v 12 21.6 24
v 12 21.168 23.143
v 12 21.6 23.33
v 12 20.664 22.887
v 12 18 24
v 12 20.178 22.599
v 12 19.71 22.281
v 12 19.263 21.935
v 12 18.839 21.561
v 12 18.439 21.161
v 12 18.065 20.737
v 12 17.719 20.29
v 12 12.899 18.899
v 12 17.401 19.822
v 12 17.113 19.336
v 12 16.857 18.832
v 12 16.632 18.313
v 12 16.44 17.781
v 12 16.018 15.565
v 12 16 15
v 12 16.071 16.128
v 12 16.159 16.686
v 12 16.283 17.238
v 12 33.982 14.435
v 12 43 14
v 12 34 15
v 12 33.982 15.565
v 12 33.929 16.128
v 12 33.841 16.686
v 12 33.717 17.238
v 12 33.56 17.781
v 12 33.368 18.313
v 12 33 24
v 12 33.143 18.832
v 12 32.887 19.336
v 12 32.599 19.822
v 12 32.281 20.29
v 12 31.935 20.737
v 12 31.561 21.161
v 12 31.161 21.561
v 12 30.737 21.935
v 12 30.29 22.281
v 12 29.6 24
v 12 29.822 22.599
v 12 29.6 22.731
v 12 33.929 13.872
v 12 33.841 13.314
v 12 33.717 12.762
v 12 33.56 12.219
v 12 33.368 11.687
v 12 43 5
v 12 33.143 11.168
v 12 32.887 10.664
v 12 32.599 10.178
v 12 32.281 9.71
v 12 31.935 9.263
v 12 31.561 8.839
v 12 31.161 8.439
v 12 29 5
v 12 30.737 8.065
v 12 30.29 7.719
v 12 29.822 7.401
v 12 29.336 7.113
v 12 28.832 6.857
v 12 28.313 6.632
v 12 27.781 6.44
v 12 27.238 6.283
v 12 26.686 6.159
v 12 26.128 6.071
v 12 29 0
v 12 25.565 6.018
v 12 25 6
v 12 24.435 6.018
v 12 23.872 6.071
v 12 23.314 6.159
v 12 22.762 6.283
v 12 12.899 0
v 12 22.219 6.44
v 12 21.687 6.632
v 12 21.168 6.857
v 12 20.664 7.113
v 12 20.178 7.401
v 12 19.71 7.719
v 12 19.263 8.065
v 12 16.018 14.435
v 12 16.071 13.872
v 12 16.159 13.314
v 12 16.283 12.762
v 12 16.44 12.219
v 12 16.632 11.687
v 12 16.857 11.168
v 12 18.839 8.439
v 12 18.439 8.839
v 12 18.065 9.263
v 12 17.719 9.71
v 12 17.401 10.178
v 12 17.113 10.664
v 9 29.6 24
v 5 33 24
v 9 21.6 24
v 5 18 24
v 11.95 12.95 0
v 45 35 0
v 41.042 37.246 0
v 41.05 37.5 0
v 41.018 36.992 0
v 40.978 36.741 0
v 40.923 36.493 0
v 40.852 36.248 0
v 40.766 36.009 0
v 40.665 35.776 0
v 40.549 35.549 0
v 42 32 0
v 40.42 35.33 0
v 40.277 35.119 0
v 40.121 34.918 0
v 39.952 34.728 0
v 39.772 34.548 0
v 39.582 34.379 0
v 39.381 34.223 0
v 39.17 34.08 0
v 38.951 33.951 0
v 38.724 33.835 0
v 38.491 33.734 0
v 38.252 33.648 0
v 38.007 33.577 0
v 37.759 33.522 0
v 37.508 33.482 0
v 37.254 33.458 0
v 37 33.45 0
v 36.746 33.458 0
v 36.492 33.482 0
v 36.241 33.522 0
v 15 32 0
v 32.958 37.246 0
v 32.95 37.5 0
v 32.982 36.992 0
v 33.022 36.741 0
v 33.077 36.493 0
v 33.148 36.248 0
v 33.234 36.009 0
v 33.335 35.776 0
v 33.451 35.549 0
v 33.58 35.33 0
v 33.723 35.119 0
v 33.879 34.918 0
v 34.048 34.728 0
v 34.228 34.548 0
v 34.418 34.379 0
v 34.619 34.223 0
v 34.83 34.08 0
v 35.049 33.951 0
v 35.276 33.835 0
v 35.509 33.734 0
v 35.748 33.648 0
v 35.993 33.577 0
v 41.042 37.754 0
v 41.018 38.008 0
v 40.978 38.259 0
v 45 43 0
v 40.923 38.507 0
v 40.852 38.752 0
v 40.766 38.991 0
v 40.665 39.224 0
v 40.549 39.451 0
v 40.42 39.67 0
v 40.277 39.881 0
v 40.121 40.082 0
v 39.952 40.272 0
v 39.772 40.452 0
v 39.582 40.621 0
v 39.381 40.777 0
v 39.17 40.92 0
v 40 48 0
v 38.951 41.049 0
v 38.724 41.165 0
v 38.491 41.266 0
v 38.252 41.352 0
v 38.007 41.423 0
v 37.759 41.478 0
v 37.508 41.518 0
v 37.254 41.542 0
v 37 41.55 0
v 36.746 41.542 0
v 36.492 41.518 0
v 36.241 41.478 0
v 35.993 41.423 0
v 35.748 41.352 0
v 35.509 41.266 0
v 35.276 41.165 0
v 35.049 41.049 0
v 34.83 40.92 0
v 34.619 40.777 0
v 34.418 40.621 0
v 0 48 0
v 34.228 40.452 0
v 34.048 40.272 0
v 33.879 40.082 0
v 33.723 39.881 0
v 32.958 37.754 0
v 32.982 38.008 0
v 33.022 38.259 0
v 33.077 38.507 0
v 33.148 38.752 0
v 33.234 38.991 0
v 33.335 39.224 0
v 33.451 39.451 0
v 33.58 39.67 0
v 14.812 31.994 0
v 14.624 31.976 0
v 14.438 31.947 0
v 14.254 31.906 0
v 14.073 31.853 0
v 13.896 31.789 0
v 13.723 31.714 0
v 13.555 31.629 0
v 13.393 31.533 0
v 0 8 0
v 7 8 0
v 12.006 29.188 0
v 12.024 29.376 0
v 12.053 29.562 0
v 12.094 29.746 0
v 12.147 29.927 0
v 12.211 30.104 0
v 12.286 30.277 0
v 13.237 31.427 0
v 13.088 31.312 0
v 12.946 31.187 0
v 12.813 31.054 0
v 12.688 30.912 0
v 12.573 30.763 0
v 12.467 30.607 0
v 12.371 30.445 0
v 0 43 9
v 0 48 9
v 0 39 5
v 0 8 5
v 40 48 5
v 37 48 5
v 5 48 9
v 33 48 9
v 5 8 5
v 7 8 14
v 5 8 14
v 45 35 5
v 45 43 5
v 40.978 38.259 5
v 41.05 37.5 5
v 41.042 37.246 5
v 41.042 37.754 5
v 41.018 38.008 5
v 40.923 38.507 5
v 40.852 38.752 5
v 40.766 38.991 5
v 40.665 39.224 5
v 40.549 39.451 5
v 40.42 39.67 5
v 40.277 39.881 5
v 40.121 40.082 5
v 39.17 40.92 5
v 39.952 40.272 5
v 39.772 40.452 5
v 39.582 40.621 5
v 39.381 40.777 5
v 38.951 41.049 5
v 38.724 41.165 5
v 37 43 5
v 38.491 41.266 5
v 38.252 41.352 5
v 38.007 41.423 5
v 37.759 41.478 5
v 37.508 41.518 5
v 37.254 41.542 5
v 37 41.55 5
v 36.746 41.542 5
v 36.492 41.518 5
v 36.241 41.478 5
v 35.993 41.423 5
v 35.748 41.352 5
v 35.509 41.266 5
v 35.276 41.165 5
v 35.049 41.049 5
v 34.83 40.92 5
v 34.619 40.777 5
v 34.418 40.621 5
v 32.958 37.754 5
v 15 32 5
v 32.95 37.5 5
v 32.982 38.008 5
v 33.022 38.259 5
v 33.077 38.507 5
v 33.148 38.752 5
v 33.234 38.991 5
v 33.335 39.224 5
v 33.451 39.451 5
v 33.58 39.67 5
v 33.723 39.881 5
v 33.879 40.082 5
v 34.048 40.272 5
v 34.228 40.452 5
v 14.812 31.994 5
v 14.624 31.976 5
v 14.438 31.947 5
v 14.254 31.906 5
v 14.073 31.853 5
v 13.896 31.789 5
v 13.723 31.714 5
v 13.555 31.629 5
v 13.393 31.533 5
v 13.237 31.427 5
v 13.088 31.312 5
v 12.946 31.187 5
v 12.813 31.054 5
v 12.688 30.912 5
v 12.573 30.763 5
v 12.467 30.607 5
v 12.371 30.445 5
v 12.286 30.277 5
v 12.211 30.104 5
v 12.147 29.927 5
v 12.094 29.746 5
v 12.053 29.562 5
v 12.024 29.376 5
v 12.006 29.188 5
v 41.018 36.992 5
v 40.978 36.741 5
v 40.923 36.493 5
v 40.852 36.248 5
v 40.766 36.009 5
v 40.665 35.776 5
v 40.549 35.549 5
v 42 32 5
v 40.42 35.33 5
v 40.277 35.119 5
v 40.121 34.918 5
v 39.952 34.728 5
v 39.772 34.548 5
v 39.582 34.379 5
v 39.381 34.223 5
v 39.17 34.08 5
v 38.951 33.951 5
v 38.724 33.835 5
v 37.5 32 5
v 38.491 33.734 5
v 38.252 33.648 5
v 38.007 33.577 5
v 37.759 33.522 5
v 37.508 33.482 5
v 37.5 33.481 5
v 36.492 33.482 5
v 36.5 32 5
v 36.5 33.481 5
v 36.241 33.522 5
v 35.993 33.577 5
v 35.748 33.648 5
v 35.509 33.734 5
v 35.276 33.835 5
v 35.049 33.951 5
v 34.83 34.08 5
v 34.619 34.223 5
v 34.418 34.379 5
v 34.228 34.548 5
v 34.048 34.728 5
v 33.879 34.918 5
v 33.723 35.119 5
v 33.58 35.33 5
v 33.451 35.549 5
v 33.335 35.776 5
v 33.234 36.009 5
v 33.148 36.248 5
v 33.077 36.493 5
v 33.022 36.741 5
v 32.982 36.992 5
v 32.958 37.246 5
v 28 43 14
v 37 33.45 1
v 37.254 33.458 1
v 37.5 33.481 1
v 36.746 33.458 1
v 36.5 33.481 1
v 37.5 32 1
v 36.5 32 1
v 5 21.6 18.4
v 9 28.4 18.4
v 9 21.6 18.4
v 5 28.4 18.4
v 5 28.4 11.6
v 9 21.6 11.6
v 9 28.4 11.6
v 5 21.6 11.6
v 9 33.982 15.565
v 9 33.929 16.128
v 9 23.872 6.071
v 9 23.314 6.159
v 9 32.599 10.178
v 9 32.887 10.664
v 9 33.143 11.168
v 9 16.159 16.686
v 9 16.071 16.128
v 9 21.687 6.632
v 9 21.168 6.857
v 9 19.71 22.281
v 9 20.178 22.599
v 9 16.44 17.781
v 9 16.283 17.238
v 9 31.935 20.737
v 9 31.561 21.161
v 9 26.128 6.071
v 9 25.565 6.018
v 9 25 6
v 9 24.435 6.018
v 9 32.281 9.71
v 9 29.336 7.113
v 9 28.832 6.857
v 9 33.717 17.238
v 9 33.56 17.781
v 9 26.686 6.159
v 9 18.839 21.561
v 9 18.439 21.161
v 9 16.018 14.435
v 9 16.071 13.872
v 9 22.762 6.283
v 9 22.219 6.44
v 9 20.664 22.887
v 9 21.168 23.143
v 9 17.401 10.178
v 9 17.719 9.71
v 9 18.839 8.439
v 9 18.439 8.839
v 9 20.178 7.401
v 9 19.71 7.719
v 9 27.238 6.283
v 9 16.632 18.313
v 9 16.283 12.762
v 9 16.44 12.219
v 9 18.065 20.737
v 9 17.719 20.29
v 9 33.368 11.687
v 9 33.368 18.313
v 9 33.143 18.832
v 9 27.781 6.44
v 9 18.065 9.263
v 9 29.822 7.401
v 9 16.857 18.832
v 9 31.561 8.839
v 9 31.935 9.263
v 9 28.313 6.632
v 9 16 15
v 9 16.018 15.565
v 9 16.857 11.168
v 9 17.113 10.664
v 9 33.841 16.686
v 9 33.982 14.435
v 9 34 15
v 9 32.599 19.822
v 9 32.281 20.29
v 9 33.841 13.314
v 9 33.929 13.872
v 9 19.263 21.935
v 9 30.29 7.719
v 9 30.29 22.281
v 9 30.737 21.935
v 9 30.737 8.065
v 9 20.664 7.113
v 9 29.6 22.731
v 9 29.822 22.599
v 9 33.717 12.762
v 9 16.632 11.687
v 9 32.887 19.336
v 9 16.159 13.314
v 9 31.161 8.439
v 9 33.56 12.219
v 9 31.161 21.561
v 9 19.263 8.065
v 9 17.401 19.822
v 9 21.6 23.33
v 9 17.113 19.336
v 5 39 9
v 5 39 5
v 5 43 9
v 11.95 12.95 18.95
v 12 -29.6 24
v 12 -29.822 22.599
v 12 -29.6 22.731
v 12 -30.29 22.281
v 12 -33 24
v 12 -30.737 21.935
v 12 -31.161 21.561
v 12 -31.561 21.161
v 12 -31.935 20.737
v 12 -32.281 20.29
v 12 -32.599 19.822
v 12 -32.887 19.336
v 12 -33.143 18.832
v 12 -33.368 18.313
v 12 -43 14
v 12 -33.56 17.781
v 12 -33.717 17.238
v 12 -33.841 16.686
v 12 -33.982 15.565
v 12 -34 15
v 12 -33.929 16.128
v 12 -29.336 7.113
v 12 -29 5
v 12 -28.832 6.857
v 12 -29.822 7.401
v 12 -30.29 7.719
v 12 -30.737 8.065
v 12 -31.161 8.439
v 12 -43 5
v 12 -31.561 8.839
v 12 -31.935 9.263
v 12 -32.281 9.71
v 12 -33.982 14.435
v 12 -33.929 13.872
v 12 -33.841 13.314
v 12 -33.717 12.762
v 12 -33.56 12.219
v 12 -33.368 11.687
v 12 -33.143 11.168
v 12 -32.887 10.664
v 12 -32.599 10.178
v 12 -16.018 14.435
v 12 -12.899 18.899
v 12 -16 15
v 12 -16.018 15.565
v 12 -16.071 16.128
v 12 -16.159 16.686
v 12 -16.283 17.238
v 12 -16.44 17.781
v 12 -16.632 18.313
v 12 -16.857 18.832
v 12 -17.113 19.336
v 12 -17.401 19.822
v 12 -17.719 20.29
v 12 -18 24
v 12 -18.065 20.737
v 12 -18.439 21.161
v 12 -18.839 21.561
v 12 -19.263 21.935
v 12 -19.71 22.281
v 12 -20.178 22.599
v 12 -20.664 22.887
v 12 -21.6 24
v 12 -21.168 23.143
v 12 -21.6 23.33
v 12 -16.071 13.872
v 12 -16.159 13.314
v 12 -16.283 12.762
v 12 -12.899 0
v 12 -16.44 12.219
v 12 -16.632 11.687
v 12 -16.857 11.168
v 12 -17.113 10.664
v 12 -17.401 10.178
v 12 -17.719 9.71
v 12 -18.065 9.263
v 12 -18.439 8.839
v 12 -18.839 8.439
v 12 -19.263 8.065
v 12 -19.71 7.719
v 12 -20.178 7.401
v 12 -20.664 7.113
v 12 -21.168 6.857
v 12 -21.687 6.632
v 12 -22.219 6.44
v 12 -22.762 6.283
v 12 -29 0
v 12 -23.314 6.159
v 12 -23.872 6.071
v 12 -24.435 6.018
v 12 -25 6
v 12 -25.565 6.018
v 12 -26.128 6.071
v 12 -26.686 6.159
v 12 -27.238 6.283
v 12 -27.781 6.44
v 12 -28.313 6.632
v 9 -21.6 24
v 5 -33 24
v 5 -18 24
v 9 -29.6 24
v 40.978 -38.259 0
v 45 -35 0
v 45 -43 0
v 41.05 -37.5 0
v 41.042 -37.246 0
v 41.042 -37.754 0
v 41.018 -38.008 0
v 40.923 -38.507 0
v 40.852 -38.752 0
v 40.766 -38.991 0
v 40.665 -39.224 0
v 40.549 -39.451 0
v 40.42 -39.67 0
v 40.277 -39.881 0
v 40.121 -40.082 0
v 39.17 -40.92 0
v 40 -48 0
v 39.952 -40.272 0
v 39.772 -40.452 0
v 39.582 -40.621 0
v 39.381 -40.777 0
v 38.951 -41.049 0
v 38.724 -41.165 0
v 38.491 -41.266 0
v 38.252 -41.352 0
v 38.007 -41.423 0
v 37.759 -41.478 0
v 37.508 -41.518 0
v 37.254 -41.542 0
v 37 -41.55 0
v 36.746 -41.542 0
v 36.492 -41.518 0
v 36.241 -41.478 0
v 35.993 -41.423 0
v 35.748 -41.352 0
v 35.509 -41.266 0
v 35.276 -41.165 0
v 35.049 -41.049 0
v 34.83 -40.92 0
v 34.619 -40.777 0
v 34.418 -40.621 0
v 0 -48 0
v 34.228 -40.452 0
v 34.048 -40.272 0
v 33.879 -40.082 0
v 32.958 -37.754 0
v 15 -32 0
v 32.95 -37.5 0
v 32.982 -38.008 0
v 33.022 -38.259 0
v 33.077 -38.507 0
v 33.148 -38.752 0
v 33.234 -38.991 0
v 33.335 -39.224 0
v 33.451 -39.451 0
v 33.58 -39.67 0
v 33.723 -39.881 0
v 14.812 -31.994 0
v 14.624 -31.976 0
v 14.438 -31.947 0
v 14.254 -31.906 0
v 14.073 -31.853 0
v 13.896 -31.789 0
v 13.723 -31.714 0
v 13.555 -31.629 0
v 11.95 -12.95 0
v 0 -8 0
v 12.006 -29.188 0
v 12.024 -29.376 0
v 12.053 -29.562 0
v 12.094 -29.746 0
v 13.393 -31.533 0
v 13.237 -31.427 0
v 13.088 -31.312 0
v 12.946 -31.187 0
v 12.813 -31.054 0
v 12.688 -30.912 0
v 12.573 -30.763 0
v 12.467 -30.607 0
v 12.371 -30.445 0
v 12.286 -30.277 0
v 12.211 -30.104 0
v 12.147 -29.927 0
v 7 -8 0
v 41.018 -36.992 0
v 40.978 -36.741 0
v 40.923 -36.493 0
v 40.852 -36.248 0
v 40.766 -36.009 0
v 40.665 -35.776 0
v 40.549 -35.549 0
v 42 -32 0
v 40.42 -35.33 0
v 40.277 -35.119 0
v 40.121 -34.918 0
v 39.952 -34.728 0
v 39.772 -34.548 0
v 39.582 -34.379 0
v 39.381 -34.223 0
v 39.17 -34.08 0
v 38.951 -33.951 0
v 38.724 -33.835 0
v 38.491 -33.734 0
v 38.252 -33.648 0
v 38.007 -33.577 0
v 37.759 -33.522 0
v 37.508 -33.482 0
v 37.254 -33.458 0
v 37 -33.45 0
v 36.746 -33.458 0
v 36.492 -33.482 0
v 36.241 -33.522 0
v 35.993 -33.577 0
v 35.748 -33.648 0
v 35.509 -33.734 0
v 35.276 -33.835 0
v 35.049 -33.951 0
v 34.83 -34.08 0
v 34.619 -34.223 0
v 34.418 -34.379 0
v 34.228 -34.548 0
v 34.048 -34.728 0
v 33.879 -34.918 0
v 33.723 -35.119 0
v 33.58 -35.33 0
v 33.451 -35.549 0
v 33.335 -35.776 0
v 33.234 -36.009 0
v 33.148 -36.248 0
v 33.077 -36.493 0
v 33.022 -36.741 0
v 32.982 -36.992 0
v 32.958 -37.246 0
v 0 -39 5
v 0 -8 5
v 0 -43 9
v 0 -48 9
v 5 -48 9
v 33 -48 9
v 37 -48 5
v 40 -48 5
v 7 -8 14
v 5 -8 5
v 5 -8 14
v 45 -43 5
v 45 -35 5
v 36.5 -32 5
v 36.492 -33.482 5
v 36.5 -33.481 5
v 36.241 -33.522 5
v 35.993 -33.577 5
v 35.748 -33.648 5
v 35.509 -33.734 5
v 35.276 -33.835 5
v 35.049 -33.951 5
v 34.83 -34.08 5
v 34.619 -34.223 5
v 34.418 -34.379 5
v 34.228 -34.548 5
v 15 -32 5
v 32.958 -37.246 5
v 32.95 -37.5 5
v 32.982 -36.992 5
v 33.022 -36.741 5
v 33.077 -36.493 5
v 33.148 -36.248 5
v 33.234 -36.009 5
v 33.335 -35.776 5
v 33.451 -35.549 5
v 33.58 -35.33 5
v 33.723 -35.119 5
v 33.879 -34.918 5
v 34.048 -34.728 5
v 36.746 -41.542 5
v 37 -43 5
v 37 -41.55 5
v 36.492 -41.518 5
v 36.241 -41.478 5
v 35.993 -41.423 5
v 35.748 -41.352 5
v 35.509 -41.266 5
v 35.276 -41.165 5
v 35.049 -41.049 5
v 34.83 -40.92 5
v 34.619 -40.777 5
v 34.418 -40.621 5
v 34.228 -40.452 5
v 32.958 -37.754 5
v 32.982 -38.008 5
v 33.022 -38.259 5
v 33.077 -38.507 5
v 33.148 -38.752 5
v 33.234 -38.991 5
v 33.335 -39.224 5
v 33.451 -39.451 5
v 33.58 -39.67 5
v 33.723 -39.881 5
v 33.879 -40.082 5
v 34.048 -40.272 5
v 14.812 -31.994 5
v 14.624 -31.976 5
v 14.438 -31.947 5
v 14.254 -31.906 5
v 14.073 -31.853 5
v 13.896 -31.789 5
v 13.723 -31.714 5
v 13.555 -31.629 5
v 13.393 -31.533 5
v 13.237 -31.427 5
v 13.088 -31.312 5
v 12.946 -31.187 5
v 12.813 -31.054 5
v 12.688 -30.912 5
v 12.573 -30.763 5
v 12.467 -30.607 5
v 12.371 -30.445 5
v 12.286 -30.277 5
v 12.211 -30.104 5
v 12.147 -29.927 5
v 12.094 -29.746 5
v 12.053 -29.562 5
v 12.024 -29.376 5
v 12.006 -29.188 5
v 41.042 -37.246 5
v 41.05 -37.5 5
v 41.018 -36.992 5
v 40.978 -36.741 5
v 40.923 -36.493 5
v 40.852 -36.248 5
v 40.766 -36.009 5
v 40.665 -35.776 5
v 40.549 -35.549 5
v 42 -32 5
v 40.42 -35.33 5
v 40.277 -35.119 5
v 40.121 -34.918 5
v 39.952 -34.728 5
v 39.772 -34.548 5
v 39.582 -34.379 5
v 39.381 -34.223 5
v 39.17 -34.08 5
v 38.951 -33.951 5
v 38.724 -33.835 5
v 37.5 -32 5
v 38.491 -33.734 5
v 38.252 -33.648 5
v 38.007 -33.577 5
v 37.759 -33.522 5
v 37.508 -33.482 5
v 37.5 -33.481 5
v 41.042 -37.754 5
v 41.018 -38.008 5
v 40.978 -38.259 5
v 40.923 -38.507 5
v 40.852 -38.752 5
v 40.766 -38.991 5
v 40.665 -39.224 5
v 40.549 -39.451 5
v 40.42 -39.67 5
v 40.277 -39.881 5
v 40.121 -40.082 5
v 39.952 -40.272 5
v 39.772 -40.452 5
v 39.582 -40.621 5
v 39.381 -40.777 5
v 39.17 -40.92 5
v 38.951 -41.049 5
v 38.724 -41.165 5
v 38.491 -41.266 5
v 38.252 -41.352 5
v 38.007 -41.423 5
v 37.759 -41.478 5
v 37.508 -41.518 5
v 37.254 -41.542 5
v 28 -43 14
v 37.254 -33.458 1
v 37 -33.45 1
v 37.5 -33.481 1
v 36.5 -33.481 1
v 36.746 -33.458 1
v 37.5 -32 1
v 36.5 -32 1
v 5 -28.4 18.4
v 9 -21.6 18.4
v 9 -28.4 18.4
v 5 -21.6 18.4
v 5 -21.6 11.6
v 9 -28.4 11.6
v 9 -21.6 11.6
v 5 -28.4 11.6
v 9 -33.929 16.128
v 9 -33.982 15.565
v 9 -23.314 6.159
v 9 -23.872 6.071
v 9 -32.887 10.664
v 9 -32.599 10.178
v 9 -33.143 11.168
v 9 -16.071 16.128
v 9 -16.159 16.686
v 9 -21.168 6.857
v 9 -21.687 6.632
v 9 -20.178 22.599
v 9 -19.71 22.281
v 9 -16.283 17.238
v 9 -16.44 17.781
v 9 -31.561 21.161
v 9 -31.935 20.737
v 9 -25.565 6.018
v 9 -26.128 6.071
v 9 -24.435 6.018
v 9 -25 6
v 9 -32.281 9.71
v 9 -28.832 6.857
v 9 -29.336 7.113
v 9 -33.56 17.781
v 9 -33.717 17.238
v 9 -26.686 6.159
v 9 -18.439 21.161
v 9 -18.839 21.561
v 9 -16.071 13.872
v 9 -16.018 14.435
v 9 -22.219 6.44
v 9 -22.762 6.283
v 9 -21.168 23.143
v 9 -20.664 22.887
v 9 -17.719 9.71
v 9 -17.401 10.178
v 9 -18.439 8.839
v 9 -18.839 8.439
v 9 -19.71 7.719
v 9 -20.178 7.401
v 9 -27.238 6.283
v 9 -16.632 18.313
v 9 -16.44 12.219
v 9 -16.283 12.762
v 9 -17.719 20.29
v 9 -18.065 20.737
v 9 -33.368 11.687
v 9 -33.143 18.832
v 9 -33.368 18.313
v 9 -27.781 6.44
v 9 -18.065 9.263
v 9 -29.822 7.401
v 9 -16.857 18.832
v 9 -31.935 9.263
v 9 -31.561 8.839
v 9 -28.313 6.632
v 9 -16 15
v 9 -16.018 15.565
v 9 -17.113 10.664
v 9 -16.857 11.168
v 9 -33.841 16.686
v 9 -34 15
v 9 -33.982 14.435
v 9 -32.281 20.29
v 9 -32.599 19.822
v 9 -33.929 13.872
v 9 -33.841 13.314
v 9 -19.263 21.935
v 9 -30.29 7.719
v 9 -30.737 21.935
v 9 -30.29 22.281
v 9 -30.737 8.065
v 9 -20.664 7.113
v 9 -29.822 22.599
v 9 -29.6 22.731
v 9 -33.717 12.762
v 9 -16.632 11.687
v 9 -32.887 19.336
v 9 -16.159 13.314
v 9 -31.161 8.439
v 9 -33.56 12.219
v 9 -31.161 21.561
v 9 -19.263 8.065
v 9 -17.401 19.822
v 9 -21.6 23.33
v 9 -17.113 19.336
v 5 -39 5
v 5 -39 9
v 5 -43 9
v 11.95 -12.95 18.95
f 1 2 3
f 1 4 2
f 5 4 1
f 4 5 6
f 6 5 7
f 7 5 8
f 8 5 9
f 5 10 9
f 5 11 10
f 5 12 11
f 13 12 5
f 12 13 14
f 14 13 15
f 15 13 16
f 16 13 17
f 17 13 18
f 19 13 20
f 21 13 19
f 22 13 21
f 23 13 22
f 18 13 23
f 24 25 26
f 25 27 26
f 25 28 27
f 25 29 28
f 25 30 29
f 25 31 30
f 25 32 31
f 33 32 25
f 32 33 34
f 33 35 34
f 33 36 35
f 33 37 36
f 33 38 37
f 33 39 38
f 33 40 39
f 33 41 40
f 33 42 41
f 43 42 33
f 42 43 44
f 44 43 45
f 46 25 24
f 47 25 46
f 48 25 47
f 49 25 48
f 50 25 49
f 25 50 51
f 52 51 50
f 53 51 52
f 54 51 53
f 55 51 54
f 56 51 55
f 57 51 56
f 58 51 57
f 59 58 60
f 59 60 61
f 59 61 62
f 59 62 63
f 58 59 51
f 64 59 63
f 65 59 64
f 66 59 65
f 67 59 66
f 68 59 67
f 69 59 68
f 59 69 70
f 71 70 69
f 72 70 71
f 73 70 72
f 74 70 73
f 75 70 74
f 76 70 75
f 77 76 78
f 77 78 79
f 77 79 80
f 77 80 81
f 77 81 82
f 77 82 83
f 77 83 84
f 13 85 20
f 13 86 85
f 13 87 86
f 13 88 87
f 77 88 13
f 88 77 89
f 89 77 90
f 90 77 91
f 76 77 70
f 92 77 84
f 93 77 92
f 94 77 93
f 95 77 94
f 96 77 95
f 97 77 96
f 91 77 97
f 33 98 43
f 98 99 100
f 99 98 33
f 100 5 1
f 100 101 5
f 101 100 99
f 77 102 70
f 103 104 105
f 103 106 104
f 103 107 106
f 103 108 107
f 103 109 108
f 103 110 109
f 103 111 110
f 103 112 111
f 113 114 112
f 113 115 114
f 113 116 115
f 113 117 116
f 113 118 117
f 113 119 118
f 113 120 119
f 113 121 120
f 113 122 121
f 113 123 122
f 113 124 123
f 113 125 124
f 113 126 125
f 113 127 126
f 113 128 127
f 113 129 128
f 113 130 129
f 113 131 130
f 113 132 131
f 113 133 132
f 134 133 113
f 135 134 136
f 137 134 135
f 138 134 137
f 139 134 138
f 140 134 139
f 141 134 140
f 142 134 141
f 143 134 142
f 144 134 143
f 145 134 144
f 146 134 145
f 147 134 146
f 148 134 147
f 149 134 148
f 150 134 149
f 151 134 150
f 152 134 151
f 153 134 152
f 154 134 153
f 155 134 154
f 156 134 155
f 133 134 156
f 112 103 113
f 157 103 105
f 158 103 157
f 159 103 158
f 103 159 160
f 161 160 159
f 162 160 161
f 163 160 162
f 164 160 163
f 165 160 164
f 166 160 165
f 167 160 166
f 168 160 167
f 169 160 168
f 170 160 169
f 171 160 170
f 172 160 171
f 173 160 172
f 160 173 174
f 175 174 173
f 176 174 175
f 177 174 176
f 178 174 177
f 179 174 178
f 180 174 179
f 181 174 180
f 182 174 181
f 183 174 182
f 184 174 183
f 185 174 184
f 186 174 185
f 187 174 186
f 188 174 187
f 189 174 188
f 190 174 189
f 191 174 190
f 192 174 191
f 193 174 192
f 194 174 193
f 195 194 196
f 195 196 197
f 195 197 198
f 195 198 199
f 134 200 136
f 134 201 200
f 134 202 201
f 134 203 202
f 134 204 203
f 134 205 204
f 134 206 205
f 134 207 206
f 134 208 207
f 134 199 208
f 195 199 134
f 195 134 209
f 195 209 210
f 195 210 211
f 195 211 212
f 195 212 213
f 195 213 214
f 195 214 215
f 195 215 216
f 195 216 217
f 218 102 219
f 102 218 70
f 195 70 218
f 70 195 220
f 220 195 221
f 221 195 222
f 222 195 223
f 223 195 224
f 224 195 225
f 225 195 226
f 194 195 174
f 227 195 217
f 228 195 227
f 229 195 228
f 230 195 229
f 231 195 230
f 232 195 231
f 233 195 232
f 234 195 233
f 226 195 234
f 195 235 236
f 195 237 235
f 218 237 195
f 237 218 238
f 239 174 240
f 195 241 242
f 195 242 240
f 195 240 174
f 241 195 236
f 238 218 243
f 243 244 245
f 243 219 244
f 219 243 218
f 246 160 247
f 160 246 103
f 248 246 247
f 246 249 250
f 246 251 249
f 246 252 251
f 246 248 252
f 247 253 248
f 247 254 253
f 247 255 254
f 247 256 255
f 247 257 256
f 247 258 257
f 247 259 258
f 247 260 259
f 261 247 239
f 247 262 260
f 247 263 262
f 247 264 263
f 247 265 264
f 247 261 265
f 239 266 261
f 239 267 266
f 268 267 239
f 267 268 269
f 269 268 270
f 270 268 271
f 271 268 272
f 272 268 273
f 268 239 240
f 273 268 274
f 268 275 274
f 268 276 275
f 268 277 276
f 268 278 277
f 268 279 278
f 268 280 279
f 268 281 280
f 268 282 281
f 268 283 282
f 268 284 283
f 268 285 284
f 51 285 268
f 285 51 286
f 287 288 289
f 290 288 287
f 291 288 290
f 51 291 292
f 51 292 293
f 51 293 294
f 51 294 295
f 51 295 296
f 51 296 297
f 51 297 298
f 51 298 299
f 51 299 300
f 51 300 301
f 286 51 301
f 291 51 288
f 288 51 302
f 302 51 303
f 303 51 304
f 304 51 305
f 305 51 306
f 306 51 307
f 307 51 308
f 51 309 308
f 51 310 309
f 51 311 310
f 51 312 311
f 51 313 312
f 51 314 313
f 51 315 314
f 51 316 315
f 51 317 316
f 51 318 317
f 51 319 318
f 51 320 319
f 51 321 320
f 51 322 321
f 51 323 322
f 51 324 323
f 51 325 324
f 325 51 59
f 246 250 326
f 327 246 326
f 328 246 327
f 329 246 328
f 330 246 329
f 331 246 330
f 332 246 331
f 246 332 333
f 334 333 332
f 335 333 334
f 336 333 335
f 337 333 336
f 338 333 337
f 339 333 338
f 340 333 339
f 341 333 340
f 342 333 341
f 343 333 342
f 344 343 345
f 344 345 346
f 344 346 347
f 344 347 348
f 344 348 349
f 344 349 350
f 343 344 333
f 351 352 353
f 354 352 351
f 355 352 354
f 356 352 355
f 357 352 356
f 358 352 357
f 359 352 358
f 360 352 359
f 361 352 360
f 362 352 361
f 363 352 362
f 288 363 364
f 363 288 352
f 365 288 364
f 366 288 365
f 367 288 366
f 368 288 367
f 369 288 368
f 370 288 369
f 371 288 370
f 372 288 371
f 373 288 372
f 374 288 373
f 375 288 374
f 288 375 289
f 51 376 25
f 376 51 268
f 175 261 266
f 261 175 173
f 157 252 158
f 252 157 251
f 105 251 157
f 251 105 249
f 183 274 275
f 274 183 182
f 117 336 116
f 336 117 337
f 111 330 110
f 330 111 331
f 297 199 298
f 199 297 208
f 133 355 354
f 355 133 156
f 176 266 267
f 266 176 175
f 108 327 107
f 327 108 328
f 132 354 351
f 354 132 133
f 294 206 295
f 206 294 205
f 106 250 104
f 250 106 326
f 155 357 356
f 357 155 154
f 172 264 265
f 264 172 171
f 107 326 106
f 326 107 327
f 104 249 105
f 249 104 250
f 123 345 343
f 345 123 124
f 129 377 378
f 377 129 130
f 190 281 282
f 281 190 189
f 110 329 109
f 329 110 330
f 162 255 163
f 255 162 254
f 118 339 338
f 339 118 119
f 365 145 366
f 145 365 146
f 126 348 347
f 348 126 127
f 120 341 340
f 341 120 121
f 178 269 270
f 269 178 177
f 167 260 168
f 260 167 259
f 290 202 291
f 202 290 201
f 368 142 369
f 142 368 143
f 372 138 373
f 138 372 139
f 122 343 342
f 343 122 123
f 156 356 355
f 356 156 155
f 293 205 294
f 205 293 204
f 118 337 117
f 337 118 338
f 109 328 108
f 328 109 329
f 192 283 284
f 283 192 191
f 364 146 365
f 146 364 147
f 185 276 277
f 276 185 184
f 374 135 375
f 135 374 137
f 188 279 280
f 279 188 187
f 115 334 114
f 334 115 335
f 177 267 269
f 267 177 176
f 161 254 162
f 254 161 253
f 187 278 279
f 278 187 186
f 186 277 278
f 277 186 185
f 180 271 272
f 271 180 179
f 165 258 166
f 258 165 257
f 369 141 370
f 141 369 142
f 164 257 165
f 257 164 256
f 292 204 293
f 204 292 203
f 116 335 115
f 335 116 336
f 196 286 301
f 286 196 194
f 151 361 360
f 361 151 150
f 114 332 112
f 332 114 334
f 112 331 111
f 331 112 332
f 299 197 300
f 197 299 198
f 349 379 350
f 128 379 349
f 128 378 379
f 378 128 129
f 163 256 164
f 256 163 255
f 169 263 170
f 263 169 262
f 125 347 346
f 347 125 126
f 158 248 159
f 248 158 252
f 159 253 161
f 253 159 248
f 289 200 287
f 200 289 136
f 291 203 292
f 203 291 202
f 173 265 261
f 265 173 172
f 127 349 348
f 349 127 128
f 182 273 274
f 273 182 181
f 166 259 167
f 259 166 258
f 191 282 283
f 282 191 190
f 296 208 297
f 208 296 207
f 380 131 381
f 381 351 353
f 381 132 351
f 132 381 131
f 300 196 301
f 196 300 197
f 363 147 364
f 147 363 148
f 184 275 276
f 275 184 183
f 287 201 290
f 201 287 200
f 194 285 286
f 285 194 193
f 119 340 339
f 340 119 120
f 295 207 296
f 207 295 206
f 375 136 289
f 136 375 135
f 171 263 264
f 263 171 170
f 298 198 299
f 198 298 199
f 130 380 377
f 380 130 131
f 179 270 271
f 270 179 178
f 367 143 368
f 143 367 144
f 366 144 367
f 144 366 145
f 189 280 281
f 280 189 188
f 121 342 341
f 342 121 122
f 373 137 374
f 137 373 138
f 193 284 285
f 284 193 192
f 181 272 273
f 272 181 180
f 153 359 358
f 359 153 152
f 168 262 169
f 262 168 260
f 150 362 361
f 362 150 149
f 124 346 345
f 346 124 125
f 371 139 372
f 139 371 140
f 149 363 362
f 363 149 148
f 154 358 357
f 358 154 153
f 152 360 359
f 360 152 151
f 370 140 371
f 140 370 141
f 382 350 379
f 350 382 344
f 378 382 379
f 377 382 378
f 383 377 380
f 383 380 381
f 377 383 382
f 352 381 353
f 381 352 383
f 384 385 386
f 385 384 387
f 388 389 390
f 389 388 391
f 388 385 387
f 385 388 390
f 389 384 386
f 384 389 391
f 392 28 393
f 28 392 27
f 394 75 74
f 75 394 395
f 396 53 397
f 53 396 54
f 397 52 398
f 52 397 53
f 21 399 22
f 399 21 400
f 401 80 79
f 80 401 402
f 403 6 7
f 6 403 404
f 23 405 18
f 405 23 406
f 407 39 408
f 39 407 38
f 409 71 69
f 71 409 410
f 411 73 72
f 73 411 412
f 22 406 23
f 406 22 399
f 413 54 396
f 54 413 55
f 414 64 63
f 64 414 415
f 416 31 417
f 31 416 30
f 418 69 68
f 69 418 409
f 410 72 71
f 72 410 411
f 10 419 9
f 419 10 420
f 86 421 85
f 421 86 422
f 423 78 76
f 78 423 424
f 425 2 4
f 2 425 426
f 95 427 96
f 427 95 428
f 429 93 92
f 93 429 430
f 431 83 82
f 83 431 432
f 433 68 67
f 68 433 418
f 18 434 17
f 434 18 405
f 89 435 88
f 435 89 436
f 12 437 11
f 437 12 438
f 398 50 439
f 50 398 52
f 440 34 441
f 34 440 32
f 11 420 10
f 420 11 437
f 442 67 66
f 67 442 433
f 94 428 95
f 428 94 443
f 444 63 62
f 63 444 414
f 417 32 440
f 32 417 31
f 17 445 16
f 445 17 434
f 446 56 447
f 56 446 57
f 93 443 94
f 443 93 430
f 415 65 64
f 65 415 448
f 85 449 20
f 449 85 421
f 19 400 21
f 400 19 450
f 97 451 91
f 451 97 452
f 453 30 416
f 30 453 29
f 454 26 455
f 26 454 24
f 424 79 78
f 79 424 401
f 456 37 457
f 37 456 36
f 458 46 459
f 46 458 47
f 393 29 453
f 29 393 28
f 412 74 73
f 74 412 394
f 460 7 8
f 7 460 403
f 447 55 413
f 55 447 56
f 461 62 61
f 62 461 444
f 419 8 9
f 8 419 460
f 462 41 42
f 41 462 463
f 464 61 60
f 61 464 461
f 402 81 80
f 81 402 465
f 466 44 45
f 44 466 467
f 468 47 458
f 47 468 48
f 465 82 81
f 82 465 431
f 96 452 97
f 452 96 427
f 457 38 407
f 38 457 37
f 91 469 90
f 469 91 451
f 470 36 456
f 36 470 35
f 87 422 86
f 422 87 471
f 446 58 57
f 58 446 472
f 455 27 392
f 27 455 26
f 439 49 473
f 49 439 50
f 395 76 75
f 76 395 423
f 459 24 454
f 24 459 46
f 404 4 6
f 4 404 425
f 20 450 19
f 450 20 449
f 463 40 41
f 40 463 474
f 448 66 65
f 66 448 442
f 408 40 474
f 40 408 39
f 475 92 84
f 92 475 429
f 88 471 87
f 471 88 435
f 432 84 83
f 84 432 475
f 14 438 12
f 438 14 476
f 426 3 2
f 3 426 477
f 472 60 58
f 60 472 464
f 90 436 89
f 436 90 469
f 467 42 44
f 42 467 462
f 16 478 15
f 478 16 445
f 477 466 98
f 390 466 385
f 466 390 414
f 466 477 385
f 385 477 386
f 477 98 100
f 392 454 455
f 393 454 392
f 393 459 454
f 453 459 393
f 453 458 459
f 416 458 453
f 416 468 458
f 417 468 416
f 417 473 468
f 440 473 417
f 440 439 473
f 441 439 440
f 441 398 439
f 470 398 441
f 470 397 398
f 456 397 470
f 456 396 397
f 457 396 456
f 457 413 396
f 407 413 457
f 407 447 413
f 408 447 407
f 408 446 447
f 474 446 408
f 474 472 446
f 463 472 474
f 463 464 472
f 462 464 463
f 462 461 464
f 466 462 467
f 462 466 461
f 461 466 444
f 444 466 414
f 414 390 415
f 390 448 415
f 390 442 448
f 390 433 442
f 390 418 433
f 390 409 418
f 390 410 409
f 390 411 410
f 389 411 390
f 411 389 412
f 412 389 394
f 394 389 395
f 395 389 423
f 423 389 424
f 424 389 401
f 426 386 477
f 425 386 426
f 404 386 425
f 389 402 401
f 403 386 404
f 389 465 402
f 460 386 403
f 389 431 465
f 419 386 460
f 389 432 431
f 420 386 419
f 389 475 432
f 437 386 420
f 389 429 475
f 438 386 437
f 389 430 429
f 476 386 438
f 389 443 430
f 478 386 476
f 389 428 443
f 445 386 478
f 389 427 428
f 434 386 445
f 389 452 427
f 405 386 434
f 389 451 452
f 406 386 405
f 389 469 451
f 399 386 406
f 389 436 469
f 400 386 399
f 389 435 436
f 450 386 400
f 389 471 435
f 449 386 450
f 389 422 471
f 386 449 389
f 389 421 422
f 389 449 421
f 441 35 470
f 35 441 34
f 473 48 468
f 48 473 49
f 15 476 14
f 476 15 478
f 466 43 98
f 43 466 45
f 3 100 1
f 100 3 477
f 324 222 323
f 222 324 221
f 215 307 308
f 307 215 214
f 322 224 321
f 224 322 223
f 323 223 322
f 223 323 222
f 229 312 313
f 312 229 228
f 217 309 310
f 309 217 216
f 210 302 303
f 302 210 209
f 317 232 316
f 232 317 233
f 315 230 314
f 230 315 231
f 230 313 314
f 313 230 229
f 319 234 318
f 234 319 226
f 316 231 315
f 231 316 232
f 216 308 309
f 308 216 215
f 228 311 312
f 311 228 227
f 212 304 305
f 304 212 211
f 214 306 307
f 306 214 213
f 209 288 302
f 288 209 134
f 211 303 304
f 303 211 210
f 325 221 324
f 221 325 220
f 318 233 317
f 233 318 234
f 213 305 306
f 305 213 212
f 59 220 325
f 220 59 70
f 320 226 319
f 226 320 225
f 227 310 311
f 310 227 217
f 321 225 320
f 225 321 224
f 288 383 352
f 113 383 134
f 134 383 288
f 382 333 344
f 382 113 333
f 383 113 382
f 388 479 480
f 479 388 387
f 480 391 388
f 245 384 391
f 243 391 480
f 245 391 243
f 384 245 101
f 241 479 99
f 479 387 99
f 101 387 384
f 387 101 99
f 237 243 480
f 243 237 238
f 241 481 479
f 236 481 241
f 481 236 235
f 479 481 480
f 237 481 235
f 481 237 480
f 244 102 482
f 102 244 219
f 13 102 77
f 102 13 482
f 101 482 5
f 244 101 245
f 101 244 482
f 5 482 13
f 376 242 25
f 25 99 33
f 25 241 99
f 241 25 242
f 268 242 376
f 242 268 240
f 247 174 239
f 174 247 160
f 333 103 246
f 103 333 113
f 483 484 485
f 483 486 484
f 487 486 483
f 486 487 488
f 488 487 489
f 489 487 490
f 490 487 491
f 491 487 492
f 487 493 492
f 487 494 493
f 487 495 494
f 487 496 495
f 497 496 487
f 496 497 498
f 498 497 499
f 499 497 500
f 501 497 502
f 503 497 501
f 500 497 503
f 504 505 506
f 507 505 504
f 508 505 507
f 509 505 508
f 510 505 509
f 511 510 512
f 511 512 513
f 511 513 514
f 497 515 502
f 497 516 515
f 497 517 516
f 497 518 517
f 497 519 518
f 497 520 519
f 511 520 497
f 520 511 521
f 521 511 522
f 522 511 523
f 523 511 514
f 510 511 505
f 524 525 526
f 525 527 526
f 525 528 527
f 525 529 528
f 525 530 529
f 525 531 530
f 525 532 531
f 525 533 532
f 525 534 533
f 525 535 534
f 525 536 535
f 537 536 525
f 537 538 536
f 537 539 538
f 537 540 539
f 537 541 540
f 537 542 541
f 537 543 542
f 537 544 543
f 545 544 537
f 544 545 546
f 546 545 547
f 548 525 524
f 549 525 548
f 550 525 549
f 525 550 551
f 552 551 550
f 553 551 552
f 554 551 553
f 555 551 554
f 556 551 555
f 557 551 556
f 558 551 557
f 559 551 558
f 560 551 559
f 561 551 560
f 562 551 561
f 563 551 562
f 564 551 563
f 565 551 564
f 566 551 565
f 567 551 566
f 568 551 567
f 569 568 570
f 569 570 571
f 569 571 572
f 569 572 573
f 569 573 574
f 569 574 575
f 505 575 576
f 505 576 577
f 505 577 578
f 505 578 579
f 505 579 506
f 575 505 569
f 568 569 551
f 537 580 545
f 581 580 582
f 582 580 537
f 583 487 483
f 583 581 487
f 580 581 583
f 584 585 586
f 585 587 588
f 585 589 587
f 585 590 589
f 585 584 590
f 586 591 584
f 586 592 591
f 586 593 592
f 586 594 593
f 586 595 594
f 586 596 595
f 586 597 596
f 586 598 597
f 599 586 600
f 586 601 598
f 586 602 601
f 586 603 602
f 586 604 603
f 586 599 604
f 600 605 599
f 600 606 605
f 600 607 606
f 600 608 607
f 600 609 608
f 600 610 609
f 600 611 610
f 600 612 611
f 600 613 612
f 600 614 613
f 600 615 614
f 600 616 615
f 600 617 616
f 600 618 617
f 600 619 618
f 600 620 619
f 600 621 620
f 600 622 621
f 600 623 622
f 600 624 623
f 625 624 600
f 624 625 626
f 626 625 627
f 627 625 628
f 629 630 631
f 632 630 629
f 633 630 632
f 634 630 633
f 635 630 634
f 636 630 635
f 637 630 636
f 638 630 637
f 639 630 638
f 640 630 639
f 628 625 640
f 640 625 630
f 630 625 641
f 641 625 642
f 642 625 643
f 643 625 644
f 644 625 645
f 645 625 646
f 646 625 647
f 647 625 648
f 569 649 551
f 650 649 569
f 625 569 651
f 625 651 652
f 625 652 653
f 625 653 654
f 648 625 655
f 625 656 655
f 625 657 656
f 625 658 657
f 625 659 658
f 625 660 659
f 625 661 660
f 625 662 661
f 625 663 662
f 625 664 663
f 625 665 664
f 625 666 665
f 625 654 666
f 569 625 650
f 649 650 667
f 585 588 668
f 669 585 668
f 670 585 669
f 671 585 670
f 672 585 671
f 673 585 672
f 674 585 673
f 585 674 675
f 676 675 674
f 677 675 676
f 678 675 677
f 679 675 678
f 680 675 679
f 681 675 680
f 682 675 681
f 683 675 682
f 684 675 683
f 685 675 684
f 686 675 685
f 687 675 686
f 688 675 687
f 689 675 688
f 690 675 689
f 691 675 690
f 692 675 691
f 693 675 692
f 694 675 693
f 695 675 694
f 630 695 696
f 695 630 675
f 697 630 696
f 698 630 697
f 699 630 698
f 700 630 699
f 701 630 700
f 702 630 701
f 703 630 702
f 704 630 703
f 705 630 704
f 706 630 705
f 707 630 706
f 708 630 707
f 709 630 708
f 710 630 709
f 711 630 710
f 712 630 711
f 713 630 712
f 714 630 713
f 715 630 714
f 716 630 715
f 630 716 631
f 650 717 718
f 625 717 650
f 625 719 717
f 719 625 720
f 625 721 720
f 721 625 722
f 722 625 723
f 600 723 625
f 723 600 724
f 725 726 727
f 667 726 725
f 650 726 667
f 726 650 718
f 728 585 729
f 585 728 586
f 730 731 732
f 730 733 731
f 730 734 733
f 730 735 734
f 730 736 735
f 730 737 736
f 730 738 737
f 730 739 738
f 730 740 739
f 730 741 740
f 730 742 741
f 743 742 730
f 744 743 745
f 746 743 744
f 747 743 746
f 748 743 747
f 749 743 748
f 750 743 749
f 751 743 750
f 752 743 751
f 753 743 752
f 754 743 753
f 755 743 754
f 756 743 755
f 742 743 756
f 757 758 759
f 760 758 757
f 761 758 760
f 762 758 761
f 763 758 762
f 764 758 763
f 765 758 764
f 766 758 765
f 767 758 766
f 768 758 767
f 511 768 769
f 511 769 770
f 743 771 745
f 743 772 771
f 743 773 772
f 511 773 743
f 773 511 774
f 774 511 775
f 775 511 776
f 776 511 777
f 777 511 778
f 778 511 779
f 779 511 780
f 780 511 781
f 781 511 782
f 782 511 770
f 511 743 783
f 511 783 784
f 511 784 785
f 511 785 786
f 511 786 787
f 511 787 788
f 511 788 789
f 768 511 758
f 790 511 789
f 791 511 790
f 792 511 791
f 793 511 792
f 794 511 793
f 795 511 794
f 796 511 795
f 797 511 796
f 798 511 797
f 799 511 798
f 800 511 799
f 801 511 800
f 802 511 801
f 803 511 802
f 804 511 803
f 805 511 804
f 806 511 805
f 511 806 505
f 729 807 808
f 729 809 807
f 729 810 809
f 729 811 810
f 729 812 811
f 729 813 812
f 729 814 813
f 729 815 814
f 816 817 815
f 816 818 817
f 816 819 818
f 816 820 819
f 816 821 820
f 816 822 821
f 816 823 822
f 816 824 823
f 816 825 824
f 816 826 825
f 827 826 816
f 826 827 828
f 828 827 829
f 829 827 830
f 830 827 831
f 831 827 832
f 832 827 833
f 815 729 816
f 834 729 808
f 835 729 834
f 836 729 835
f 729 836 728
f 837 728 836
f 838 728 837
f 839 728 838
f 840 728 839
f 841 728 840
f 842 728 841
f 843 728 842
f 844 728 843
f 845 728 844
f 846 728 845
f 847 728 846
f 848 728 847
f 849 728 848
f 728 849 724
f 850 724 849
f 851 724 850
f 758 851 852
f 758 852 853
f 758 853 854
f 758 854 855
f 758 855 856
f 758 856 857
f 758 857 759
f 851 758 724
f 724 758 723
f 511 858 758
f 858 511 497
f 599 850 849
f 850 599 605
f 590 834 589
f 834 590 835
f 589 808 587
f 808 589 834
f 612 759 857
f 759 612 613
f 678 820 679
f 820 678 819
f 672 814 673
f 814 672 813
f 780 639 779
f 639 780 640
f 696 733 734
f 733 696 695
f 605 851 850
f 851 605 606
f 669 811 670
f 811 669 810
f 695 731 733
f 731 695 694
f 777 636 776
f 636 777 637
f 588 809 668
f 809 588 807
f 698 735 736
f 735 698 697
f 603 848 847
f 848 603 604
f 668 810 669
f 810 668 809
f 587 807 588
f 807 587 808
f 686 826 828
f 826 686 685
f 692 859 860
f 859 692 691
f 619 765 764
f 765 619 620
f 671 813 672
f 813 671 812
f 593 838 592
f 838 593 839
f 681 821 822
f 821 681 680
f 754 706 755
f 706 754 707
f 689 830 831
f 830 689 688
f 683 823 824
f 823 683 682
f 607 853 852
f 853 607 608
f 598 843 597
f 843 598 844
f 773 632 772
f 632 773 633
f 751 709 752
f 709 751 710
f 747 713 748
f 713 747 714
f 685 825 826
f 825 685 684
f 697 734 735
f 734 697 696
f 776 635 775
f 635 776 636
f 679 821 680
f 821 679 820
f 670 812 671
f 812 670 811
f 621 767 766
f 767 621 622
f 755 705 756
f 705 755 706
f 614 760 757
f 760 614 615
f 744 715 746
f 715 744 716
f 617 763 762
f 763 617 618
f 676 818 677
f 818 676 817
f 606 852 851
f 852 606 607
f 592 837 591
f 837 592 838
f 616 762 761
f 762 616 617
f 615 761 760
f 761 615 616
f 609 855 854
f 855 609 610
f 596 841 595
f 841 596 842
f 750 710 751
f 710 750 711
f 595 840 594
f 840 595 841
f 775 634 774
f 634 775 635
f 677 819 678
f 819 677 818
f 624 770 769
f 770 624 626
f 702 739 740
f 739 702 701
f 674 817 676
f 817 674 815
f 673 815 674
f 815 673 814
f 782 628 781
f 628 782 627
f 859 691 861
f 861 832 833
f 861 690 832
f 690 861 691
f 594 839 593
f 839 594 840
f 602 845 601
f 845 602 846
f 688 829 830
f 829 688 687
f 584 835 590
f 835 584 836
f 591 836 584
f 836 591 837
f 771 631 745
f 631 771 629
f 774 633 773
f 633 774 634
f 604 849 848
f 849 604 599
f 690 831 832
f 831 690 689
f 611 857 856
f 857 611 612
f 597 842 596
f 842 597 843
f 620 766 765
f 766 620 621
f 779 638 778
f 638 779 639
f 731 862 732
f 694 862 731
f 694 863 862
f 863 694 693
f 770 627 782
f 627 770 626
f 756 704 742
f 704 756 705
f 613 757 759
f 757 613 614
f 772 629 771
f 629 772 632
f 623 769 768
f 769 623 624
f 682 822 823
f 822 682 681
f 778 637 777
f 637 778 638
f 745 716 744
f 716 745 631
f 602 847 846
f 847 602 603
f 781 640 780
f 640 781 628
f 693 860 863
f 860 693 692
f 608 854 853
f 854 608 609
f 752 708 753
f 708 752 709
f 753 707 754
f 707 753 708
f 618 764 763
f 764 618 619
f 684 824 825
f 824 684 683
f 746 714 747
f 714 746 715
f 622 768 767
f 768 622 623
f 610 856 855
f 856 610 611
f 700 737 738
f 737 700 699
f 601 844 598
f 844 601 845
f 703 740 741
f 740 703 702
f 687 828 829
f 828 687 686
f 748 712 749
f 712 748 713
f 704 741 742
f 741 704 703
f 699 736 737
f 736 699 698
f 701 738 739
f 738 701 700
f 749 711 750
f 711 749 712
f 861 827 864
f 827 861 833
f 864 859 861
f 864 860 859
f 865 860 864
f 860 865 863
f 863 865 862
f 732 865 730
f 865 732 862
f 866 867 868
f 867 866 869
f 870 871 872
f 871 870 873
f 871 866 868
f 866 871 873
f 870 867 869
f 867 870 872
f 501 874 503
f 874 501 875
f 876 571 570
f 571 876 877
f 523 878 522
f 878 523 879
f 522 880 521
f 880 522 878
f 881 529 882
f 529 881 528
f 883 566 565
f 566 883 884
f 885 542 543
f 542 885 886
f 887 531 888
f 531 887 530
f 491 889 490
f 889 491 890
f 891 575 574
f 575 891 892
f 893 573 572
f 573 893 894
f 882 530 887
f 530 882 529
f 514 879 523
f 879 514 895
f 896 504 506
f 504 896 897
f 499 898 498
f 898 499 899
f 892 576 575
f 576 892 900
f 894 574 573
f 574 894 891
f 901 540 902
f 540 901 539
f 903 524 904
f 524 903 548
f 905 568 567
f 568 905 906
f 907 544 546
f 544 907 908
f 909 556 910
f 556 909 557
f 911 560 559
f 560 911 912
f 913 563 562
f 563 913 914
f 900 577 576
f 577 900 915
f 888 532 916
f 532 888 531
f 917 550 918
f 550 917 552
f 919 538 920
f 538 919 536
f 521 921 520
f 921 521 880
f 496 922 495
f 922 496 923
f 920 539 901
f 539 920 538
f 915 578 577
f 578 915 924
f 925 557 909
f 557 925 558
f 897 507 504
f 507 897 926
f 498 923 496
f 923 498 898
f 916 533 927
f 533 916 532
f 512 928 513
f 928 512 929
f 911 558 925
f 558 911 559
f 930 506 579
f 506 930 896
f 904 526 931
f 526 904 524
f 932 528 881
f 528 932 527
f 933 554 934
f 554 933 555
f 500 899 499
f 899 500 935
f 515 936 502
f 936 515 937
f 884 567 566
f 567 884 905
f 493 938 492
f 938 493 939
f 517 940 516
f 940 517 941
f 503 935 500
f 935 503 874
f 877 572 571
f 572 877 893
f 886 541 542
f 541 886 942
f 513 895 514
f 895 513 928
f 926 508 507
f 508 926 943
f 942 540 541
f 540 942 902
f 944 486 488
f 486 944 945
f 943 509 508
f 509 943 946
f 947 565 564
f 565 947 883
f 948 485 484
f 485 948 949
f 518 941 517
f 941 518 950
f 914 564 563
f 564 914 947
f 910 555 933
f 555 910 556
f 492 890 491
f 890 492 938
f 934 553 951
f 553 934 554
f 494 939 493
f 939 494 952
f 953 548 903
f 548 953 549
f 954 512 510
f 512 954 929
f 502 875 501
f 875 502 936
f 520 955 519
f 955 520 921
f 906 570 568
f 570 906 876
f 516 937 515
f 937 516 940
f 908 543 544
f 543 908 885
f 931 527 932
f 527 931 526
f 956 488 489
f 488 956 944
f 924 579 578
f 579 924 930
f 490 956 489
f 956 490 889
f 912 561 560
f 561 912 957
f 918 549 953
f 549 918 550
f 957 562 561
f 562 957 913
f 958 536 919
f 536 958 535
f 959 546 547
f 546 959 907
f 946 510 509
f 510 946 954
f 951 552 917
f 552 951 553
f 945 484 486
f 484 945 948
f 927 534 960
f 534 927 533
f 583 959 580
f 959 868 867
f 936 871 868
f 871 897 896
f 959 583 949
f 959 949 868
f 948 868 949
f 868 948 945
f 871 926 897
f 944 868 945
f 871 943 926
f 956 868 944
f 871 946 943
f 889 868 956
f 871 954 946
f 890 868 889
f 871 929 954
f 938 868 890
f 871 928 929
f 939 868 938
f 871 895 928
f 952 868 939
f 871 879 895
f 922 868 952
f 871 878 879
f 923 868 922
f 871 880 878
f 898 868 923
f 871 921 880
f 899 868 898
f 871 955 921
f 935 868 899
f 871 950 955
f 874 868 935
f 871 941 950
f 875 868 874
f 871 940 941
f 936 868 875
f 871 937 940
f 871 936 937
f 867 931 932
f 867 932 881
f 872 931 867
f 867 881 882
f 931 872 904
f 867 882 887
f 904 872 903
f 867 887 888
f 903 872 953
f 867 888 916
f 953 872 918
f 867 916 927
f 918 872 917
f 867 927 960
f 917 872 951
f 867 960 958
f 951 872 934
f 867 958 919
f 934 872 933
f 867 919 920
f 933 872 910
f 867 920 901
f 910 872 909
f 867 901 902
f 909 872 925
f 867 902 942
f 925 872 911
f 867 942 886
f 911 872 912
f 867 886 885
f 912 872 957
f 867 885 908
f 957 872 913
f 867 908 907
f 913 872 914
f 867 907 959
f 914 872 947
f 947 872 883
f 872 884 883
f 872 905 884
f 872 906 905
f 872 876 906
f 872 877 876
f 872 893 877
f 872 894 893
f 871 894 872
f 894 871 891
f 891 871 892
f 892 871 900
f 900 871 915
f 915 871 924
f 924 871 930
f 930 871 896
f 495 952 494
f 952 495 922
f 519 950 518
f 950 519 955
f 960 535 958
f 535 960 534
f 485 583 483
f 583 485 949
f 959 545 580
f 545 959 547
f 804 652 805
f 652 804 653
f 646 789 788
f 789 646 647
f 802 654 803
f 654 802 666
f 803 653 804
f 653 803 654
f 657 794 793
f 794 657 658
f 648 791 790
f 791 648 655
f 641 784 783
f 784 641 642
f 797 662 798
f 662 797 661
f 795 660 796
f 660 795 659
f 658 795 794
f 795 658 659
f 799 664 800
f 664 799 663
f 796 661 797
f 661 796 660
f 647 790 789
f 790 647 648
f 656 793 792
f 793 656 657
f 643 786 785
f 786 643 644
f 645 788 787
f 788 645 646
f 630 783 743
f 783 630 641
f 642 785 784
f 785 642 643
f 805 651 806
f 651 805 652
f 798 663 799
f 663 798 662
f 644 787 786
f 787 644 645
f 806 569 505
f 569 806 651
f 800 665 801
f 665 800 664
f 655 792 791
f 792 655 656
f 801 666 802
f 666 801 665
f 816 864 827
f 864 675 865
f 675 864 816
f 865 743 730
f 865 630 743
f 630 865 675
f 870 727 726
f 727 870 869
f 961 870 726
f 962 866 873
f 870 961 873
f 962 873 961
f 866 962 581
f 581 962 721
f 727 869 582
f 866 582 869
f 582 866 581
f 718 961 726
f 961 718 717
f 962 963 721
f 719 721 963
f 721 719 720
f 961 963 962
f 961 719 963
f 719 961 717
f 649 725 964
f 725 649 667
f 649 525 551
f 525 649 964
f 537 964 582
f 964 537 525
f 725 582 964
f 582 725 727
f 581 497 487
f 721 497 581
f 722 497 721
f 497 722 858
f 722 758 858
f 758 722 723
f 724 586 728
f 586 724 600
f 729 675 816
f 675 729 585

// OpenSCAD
// Created from Code_Ztop.stl
// https://github.com/Mecan0/Code
// By J.Rodigo (www.jra.so)
// Licence Creative commons atribution & share alike.

/**************************/
// Parámetros de la pieza  /
/**************************/

dBar = 8.1;		// Diámetro de la varilla (8.1)

//Características del tornillo 
dCab = 18;		// Diámetro de la cabeza (18)
hcub = 6.8;		// Anchura del cuadrado (6.8)



// Bloque a trabajar
module bloque(){
	// Bloque tornillo en el eje y
	cube([12, 40, 24]);
	// Bloque varilla en plano xy
	translate([0, 21, 0])
	cube([45, 19, 5]);
	// Bloque a lo largo del eje x
	translate([0, 35, 0])
	cube([37, 5, 24]);
}

// Redondeo del bloque varilla en plano xy
module redondeoxy(){
	// Redondeo
	translate([15, 21, -1])
	cylinder(h = 7, r = 3, $fn=100);
	// Vaciado del sobrante
	translate([15, 20, -1])
	cube([31, 4, 7]);
}

// Alojamiento de la varilla
module tvar(){
	// Taladro
	translate([37, 29.5, -1])
	cylinder(h = 7, r = dBar/2, $fn=100);
	// Canal
	translate([36.5, 23.5, 1])
	cube([1, 6, 5]);
}

// Alojamiento del tornillo
module ttor(){
	translate([9, 17, 15])
	union() {
		// Parte cuadrada
		cube([20, hcub, hcub], center = true);
		// Parte cilíndrica
		rotate( 90, [0, 1, 0])
		cylinder(h = 4, r = dCab/2, $fn=100);
	}
	// Vaciado superior
	translate([9, 13.6, 15])
	cube([4, 8, 10]);
}

// Operaciones a lo largo del eje y
module operacionesY(){

	translate([-1, -1, 5])
	cube([6, 32, 20]);

	translate([-1, 30, 9])
	cube([6, 11, 16]);

	translate([-1, 31, 5])
	rotate( 90 ,[0, 1, 0])
	rotate( 135 ,[0, 0, 1])
	cube([6, 6, 6]);

}

// Chaflanes del bloque tornillo
module chaftor(){
	// Chaflán verticall
	translate([7, 0, -1])
	rotate( -45 ,[0, 0, 1])
	cube([4, 7, 21]);
	// Chaflán superior
	translate([4, 0, 14])
	rotate( 90 ,[0, 1, 0])
	rotate( 135 ,[0, 0, 1])
	cube([15, 8, 9]);
}

//Chaflanes a lo largo del eje X
module chaflanX(){
	// Chaflán grande
	translate([0, 40, 9])
	rotate( 90 ,[0, 1, 0])
	rotate( 135 ,[0, 0, 1])
	cube([12, 22, 34]);
	// Chaflán pequeño
	translate([37, 41, 5])
	rotate( 90 ,[1, 0, 0])
	rotate( 45 ,[0, 0, 1])
	cube([15, 22, 7]);
}

//Chaflanes del bloque varilla en plano xy
module chafvar(){
	// Chaflán grande
	translate([45, 35, -1])
	rotate( 45 ,[0, 0, 1])
	cube([6, 8, 7]);
	// Chaflán pequeño
	translate([42, 24, -1])
	rotate( -45 ,[0, 0, 1])
	cube([8, 12, 7]);
}

// Unión de todos los bloques y operaciones
module pieza(){
	difference () {
		// Bloque a trabajar
		bloque();

		// Unión de operaciones
		union() {
			// Alojamiento de la varilla
			tvar();
			// Alojamiento para el tornillo
			ttor();
			// Redondeo del bloque varilla en plano xy
			redondeoxy();
			// Operaciones a lo largo del eje y
			operacionesY();
			// Chaflanes
			chaftor();
			chaflanX();
			chafvar();

		} //union end	
	} // difference end
} // module pieza end

/**************************/
//  Generamos las piezas   /
/**************************/

// Pieza normal
translate([0, 8, 0])
pieza();

// Pieza simetrica
translate([0, -8, 0])
mirror([ 0, 1, 0 ]) 
pieza();
